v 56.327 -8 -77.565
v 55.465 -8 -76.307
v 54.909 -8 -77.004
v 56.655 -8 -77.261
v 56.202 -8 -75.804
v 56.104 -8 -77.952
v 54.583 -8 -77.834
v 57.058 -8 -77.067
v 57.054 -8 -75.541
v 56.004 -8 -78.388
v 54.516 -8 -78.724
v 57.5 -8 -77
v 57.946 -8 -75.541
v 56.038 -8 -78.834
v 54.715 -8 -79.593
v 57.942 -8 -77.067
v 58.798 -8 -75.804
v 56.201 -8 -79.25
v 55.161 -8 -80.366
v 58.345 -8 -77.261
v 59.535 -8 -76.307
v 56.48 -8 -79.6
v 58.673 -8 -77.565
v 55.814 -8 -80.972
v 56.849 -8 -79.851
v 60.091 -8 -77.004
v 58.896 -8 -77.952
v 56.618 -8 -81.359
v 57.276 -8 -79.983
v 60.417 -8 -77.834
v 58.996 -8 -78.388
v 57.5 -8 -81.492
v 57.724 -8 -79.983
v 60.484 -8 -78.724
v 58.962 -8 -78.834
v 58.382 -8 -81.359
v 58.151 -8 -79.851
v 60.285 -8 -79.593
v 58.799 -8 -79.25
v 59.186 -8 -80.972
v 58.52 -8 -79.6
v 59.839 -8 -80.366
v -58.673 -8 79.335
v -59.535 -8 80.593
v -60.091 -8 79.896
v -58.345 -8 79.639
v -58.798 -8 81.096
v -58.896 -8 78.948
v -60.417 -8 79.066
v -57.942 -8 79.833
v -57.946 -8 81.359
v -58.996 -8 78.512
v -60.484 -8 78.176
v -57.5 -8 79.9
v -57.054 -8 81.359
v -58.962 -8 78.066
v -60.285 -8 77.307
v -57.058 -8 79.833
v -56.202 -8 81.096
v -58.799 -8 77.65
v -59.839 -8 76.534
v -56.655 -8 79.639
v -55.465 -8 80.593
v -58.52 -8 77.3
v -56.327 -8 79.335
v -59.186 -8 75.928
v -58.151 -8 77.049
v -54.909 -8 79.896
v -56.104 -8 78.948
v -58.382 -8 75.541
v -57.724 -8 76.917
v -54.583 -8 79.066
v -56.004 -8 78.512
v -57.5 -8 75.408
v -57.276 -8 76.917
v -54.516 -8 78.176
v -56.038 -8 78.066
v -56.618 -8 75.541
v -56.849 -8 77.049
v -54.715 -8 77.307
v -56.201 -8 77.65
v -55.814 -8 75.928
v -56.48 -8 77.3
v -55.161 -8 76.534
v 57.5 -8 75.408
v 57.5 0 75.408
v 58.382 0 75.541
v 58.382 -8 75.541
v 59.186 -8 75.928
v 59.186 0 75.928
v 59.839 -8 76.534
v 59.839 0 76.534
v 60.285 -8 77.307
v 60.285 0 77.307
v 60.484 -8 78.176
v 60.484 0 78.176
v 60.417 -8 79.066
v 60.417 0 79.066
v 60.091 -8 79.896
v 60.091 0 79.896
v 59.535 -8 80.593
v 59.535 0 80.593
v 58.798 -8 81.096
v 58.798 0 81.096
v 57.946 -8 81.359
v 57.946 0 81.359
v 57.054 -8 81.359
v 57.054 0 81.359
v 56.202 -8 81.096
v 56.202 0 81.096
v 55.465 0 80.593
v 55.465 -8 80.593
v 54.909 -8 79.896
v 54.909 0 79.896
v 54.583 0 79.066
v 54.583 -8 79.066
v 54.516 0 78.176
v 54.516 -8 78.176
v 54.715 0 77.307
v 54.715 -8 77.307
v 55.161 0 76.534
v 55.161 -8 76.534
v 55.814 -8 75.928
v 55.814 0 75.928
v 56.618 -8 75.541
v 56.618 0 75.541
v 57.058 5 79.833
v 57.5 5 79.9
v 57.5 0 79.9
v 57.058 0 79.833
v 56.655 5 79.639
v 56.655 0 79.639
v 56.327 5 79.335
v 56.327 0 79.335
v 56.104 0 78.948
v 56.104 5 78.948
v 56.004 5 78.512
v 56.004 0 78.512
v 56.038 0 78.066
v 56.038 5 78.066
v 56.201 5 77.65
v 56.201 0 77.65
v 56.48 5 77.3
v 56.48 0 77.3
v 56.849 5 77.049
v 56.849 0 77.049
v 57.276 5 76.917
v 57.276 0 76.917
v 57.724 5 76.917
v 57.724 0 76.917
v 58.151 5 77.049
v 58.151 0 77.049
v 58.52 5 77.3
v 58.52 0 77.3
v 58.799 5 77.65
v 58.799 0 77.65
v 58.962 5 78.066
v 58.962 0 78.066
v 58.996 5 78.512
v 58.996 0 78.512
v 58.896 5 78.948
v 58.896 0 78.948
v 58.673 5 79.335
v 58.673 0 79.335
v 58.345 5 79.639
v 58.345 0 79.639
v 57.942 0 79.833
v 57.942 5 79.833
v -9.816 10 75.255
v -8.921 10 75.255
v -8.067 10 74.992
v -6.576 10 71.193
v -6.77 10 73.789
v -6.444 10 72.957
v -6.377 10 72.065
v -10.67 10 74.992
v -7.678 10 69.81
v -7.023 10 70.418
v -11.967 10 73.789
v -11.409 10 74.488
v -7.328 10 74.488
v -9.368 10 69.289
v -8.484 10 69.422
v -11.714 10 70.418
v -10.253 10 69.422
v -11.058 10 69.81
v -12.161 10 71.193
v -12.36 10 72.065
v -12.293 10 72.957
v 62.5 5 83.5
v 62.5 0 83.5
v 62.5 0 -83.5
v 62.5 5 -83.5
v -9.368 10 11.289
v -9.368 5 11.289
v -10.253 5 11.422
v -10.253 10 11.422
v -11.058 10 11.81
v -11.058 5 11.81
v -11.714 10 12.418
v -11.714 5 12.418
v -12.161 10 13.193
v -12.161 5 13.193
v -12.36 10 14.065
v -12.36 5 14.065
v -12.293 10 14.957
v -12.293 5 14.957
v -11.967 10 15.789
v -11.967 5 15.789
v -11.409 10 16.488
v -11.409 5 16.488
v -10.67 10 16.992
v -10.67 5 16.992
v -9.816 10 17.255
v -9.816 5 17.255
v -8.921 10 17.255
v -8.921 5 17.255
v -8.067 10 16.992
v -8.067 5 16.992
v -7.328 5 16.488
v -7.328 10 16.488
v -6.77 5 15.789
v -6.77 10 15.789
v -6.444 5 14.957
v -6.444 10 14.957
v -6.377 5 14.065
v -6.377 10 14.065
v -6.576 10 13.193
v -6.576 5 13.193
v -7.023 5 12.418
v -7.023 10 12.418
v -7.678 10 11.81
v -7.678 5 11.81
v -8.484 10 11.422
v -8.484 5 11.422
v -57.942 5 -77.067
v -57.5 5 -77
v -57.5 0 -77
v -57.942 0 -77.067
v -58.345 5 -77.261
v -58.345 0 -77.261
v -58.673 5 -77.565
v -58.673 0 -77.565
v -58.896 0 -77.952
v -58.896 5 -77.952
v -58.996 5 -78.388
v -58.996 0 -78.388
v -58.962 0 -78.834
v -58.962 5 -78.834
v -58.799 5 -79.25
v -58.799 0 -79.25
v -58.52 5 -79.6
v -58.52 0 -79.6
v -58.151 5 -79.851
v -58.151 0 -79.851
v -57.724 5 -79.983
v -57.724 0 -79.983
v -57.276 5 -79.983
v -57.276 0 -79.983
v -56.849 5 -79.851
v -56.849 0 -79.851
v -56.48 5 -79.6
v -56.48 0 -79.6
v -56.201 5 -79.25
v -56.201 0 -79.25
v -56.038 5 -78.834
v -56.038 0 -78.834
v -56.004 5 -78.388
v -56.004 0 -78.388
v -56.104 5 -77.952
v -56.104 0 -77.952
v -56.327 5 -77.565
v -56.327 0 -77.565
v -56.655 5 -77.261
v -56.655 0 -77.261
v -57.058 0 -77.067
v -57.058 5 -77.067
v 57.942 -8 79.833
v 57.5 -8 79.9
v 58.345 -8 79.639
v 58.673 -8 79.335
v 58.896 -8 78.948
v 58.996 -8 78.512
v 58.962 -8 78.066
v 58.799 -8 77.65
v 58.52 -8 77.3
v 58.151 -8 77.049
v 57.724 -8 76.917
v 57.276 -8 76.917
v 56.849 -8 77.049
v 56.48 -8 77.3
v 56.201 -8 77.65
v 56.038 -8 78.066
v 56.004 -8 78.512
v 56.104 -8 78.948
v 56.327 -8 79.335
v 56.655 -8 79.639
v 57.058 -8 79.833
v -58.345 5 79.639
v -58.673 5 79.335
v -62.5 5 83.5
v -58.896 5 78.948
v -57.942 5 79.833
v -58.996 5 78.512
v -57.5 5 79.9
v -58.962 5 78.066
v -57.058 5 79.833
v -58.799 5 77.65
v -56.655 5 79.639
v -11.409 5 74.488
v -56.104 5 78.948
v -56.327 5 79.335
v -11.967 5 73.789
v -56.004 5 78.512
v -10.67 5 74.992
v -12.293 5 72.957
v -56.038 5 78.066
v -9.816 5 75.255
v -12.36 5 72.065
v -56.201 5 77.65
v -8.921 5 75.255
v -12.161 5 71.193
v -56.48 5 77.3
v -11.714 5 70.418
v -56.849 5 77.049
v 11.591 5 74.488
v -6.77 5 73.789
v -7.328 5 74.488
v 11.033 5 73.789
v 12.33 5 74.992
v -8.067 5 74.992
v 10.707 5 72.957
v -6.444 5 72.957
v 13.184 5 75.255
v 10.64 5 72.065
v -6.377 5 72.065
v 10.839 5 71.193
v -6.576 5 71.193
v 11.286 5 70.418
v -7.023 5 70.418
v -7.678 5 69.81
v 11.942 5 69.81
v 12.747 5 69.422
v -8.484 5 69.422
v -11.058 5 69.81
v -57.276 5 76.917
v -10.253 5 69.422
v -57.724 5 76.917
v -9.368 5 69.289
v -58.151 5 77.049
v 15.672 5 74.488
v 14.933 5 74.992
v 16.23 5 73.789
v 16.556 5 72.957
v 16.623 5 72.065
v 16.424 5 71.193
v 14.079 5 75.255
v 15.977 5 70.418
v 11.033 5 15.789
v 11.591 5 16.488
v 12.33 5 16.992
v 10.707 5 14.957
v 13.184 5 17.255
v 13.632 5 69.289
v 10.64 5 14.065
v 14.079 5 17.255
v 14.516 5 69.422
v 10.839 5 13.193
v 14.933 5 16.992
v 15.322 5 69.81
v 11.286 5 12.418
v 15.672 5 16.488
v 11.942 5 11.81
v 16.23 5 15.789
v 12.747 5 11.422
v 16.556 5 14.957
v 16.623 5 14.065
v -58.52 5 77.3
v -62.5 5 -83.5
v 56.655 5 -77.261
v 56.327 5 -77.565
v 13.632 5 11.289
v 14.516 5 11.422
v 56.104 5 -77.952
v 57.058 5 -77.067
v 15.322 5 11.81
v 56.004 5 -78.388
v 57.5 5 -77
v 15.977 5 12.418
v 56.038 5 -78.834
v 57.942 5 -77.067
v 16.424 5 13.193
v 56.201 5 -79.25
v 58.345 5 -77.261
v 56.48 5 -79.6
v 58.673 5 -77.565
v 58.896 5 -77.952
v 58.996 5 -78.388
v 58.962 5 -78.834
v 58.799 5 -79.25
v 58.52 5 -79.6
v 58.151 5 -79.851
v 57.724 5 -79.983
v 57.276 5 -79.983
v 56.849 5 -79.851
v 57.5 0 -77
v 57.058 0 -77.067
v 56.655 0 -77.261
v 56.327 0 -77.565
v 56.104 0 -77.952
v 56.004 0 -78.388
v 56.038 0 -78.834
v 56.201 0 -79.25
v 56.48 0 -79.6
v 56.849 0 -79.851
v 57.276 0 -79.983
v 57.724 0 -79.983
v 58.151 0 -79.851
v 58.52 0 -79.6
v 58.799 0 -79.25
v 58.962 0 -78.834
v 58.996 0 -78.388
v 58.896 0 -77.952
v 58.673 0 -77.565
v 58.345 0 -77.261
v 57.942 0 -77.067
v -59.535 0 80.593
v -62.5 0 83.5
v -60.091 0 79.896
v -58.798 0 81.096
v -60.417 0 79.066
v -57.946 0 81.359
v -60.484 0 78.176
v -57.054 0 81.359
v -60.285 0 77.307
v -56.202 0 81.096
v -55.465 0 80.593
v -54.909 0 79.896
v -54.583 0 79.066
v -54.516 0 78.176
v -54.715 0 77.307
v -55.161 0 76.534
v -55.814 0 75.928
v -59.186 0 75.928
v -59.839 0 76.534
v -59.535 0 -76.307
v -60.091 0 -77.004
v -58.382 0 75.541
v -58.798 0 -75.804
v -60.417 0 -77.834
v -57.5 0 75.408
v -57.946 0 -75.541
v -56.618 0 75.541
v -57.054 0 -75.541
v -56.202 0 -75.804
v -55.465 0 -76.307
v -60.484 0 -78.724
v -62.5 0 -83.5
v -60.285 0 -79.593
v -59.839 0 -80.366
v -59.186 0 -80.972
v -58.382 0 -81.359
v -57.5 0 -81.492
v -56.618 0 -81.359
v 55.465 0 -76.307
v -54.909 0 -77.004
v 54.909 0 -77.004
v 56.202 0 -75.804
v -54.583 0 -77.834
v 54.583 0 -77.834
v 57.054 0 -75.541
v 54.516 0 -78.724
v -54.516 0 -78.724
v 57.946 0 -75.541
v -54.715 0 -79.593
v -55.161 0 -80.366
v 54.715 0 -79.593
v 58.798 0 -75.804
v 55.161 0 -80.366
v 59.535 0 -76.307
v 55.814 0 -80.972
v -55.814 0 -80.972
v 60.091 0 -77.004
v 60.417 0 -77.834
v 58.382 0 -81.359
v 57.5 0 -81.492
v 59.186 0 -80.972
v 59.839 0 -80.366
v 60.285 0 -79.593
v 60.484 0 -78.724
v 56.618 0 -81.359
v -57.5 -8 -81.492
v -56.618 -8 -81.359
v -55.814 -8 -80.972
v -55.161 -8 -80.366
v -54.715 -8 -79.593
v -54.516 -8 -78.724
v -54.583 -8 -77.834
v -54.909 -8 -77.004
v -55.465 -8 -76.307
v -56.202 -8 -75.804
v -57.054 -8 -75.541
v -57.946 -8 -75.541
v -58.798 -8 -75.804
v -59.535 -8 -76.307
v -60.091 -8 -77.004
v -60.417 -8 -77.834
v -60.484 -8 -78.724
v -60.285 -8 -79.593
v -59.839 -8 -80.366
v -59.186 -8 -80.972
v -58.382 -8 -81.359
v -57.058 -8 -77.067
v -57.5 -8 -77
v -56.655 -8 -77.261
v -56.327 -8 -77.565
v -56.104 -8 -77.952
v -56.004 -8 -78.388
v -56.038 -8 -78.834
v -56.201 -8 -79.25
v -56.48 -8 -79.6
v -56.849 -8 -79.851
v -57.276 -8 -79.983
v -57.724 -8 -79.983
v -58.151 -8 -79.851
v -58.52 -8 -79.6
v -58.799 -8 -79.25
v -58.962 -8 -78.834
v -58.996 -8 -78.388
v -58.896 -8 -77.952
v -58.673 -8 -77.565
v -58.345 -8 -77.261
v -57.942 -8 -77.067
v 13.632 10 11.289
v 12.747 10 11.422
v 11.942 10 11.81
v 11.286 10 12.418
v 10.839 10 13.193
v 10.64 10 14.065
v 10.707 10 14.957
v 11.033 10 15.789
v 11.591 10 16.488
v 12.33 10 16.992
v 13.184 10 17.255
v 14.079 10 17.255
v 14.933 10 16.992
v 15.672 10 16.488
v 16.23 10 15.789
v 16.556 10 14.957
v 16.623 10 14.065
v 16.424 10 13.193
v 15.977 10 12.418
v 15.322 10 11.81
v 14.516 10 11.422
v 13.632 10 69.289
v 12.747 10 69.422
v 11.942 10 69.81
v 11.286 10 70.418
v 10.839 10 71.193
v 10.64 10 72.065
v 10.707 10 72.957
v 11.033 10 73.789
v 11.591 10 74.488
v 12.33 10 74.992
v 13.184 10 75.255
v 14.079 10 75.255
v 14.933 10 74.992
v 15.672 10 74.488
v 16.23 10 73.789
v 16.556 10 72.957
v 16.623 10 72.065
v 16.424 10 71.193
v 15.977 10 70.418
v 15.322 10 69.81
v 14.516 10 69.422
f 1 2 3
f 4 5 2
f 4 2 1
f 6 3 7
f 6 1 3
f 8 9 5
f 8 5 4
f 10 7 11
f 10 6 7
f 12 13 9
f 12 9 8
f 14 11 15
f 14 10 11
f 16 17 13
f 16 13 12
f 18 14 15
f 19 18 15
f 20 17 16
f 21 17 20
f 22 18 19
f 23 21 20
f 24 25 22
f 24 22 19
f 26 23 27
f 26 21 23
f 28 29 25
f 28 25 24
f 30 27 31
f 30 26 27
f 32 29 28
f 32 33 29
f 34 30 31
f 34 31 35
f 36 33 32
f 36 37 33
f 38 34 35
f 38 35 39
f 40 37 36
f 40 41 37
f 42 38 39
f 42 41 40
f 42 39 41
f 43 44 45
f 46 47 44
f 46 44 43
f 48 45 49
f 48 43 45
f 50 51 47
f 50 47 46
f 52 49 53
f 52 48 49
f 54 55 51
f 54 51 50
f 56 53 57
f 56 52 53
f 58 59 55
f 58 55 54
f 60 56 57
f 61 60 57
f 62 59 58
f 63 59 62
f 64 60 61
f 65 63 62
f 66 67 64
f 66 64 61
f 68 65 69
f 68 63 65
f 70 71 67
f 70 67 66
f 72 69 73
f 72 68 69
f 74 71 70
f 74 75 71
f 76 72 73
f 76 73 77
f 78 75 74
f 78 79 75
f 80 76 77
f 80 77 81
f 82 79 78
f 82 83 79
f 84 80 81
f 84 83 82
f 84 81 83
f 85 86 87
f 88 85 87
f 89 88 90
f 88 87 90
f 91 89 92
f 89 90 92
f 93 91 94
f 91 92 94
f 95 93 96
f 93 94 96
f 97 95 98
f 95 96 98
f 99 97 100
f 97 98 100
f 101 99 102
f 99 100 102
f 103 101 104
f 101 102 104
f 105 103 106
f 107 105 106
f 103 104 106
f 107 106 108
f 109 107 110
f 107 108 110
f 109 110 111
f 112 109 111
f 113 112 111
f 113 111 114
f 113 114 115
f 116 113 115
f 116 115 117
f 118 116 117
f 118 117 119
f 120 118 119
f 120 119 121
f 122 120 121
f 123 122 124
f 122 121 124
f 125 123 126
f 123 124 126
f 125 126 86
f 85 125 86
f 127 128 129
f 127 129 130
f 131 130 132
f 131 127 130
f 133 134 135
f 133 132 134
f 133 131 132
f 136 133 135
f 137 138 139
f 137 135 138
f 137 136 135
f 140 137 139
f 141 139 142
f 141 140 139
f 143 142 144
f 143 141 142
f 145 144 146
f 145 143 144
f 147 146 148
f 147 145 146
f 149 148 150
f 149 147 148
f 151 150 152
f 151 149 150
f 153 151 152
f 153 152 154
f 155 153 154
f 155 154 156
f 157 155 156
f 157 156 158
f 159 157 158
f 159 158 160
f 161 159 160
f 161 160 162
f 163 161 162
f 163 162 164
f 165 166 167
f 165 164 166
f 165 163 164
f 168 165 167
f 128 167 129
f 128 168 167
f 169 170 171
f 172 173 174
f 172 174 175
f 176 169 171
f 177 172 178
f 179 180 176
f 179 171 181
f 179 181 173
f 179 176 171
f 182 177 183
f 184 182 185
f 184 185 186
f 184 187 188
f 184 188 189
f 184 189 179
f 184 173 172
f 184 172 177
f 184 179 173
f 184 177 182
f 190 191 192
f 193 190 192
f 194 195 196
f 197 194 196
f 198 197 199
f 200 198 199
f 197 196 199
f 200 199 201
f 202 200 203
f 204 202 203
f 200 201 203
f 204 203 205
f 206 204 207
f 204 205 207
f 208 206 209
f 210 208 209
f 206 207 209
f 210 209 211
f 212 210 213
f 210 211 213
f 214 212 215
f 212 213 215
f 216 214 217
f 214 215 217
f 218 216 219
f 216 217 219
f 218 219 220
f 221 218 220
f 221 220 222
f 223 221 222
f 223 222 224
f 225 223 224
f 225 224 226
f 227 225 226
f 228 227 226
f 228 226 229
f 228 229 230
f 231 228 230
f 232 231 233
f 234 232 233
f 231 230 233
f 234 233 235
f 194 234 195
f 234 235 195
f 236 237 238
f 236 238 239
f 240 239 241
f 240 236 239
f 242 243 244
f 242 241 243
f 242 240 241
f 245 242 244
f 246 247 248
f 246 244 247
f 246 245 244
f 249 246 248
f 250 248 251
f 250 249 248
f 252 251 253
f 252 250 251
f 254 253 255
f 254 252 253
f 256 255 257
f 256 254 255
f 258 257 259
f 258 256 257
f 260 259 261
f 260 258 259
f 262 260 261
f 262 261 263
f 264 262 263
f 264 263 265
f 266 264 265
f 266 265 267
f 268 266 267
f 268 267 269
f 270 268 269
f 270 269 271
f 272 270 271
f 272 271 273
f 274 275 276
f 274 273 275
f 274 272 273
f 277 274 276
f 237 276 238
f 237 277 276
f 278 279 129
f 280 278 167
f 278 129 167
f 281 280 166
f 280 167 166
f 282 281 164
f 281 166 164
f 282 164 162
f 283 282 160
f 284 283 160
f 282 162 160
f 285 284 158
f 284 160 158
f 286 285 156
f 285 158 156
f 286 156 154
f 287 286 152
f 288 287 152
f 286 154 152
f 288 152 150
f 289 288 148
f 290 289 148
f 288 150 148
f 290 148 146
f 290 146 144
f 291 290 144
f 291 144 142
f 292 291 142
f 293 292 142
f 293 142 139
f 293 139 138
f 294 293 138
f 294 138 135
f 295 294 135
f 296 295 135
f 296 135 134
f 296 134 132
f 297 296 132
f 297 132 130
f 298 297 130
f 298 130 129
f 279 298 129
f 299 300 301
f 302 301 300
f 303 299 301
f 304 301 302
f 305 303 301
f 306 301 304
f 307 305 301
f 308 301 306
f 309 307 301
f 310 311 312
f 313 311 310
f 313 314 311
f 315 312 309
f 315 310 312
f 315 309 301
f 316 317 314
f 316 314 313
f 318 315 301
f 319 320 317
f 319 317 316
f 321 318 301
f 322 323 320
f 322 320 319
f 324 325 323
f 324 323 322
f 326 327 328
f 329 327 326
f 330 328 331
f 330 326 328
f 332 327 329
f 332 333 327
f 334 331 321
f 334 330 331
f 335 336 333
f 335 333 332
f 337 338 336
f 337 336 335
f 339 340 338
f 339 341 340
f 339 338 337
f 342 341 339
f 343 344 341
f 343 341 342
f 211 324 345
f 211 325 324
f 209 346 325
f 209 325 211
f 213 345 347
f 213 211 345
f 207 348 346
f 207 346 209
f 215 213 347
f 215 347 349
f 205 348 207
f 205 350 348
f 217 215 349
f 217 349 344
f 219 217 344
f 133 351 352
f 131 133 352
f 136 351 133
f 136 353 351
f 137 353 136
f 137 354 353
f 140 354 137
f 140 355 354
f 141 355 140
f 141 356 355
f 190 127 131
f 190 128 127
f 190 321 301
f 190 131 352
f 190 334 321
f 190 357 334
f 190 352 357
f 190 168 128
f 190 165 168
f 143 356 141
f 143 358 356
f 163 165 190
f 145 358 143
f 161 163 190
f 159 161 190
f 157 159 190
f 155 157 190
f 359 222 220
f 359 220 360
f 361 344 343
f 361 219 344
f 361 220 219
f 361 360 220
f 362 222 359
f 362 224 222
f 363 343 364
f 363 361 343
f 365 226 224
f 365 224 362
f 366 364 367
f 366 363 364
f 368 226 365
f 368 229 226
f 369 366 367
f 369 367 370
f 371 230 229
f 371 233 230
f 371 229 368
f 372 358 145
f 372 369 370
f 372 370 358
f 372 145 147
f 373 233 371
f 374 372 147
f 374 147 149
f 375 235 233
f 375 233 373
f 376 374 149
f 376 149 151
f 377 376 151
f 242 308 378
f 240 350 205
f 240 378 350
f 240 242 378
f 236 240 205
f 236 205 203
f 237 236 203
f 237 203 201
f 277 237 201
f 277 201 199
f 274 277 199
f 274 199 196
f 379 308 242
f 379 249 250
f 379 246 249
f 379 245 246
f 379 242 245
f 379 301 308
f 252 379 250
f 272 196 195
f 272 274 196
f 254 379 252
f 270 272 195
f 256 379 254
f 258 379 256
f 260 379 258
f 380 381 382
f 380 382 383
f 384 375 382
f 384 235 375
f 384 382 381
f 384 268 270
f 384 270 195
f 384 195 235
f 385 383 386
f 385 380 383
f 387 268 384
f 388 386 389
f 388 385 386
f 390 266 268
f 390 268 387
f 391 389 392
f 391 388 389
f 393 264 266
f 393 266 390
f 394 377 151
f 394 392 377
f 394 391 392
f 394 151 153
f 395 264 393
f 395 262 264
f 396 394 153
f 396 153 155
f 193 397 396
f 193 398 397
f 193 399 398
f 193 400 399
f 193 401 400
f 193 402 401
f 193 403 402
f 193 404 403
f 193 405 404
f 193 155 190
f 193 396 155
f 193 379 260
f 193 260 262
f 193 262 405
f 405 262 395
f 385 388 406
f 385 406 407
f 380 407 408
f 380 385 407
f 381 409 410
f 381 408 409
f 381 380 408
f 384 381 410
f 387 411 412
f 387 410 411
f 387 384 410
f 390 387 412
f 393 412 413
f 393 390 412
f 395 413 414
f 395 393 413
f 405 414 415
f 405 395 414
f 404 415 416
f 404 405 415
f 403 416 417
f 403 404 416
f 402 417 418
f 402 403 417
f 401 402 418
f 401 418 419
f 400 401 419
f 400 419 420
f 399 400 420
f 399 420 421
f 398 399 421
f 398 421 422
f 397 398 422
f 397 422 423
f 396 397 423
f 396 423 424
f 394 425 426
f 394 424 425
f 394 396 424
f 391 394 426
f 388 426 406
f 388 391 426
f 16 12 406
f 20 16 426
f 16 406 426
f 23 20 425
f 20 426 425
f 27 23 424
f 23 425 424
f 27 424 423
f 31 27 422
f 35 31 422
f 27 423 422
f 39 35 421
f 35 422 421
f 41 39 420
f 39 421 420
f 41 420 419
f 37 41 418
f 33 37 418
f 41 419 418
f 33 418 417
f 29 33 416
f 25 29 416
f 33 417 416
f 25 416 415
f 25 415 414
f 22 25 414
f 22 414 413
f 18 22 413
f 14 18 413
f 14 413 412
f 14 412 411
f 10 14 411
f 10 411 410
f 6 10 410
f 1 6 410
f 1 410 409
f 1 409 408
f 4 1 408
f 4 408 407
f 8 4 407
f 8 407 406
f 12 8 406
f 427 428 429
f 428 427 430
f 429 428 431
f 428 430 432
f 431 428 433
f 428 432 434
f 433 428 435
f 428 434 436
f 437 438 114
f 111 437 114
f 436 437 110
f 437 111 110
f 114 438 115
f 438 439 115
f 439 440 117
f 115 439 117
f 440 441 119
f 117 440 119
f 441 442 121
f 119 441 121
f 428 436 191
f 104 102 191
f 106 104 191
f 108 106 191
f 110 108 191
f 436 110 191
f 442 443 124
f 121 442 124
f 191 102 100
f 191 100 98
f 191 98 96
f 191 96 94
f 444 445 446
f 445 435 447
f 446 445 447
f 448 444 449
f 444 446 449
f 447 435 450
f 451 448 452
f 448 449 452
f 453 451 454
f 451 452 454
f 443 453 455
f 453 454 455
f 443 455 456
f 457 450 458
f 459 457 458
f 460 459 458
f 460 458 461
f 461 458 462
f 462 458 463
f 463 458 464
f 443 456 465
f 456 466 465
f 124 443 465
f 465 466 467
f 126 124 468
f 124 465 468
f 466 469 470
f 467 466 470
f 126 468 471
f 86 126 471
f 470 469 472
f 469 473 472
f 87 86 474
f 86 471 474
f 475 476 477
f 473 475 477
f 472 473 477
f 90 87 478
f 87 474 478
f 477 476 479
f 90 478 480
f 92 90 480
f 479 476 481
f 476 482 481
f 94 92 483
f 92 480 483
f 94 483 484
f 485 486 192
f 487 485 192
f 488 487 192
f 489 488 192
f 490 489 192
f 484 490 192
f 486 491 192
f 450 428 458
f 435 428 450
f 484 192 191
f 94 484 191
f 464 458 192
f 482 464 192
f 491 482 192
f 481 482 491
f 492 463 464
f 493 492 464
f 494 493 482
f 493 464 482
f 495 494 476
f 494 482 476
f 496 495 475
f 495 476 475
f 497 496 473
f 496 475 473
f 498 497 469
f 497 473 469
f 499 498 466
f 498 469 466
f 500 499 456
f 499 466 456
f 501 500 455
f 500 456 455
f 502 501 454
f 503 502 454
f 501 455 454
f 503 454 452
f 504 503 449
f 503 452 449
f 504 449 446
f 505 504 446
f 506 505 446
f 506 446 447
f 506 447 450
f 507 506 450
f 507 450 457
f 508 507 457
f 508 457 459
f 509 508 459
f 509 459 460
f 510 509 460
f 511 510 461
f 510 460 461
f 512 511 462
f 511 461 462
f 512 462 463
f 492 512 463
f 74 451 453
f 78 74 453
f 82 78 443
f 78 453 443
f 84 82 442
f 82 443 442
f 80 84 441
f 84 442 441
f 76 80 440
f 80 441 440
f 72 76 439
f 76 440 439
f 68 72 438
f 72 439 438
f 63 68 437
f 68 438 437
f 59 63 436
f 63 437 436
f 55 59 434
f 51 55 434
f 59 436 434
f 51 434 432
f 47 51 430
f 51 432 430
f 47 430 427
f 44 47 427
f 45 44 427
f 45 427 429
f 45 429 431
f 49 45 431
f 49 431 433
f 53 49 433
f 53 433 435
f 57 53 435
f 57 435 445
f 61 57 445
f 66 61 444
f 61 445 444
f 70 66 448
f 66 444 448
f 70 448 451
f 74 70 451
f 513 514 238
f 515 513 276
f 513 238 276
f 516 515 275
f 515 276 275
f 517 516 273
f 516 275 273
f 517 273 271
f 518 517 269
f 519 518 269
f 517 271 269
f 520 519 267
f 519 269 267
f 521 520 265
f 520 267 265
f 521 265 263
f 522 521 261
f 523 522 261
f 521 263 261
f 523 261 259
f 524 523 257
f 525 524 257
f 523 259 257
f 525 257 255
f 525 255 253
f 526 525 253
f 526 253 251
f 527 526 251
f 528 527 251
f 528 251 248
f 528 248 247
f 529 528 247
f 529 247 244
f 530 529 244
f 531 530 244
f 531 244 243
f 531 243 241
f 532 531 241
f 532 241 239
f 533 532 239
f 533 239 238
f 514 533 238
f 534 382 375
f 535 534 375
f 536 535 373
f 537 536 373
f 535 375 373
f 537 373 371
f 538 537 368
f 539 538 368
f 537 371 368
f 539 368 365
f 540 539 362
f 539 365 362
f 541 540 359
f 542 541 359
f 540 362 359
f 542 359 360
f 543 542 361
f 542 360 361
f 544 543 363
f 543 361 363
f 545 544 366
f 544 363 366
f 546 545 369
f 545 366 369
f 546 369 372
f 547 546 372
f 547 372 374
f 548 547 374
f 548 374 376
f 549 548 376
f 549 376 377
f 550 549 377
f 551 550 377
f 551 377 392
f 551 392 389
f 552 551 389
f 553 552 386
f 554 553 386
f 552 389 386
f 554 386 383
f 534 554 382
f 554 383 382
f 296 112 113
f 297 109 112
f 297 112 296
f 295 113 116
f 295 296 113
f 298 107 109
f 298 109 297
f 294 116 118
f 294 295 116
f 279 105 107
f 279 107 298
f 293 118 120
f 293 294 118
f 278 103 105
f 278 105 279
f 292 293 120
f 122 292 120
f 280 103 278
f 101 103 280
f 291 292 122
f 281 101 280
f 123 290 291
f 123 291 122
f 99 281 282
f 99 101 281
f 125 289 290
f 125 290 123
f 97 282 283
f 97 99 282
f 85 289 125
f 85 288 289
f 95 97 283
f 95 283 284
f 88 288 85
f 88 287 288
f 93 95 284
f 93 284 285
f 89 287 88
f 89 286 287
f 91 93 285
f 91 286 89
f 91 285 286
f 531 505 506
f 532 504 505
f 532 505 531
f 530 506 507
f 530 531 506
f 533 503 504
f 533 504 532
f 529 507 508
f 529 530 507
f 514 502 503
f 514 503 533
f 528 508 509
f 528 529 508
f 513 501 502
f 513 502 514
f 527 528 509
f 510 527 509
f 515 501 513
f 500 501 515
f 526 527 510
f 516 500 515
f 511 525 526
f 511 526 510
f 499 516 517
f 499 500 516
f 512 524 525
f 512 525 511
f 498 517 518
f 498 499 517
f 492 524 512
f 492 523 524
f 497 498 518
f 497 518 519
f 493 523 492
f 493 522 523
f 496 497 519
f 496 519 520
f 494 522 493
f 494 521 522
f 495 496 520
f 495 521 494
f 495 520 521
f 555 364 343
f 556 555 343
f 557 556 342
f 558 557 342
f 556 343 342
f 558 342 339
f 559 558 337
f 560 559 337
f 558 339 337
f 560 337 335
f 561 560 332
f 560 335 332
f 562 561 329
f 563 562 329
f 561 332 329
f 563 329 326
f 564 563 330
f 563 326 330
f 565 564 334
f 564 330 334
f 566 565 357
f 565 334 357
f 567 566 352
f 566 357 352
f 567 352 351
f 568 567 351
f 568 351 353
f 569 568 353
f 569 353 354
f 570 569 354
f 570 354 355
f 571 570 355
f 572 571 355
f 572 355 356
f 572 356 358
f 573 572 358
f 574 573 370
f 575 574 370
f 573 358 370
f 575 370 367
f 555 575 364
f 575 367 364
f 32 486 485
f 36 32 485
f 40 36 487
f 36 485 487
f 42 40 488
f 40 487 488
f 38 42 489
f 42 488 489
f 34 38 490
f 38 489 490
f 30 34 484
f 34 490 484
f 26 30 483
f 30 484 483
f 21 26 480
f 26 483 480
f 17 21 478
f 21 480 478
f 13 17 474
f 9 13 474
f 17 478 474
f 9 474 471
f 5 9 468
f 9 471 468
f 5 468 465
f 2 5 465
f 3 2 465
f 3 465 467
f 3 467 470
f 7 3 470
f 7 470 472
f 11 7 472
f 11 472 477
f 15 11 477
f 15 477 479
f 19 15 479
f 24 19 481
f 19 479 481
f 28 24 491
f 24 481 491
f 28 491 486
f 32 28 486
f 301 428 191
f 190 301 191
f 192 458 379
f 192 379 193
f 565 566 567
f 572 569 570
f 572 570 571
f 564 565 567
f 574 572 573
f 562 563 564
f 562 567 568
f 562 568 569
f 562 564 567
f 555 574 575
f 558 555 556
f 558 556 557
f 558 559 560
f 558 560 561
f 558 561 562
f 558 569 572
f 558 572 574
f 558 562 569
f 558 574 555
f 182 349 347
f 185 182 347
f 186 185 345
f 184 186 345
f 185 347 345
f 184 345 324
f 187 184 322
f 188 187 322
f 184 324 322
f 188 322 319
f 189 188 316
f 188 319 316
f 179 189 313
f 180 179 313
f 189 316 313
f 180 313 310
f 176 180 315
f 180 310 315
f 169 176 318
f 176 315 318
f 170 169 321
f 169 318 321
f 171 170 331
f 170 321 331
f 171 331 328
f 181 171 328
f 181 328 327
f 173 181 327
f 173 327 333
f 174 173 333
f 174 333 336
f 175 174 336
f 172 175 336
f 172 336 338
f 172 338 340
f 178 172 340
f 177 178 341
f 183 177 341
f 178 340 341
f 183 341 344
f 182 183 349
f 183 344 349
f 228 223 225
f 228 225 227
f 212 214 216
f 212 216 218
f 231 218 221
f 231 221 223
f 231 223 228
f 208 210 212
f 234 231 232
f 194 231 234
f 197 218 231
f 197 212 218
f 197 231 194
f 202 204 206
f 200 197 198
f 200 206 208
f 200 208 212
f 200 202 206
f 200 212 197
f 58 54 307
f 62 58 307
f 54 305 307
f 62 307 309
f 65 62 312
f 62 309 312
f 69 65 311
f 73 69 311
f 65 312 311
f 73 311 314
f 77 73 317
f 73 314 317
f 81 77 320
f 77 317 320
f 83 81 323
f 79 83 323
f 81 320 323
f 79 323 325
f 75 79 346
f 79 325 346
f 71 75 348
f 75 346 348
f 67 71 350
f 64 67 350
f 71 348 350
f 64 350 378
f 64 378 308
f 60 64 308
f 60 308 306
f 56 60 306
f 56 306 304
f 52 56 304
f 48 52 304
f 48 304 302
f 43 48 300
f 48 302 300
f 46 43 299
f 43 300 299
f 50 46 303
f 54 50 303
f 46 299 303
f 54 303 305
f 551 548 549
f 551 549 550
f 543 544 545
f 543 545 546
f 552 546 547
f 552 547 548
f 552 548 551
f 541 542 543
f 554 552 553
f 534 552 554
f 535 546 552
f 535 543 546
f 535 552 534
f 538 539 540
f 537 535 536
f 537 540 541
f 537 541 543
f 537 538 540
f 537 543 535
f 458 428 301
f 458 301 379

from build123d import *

# Parameters (mm, degrees)
ESQUISSE1_W                  = 125
ESQUISSE1_H                  = 167
BOSS_EXTRU_1_DEPTH           = 5
ENL_V_MAT_EXTRU_1_DEPTH      = 105.419825704
ENL_V_MAT_EXTRU_1_DEPTH_BACK = 105.419825704
ESQUISSE2_R                  = 1.5
ESQUISSE3_R                  = 2.992151318
BOSS_EXTRU_2_DEPTH           = 8
ESQUISSE5_R                  = 1.5
ENL_V_MAT_EXTRU_2_DEPTH      = 106.107088248
ESQUISSE6_R                  = 3
BOSS_EXTRU_3_DEPTH           = 5


with BuildPart() as part:
    # Esquisse1 → Boss.-Extru.1 (new body)
    with BuildSketch(Plane(origin=(0, 0, 0), x_dir=(1, 0, 0), z_dir=(0, 1, 0))):
        Rectangle(ESQUISSE1_W, ESQUISSE1_H)
    extrude(amount=BOSS_EXTRU_1_DEPTH)

    # Esquisse2 → Enlèv. mat.-Extru.1 (cut, two sides: drawn at the far end of the back side and taken through both)
    with BuildSketch(Plane.XZ.offset(-ENL_V_MAT_EXTRU_1_DEPTH_BACK)):
        with Locations(Location((-57.5, 78.4, 0), (0, 0, 90))):
            Circle(ESQUISSE2_R)
        with Locations(Location((57.5, 78.4, 0), (0, 0, 90))):
            Circle(ESQUISSE2_R)
        with Locations(Location((57.5, -78.5, 0), (0, 0, 90))):
            Circle(ESQUISSE2_R)
        with Locations(Location((-57.5, -78.5, 0), (0, 0, 90))):
            Circle(ESQUISSE2_R)
    extrude(amount=ENL_V_MAT_EXTRU_1_DEPTH + ENL_V_MAT_EXTRU_1_DEPTH_BACK, mode=Mode.SUBTRACT)

    # Esquisse3 → Boss.-Extru.2 (add)
    with BuildSketch(Plane.XZ):
        with Locations(Location((-57.5, 78.4, 0), (0, 0, 270))):
            Circle(ESQUISSE3_R)
        with Locations(Location((57.5, 78.4, 0), (0, 0, 270))):
            Circle(ESQUISSE3_R)
        with Locations(Location((57.5, -78.5, 0), (0, 0, 270))):
            Circle(ESQUISSE3_R)
        with Locations(Location((-57.5, -78.5, 0), (0, 0, 270))):
            Circle(ESQUISSE3_R)
    extrude(amount=BOSS_EXTRU_2_DEPTH)

    # Esquisse5 → Enlèv. mat.-Extru.2 (cut, through all)
    with BuildSketch(Plane(origin=(0, 5, 0), x_dir=(1, 0, 0), z_dir=(0, 1, 0))):
        with Locations(Location((-57.5, 78.5, 0), (0, 0, 270))):
            Circle(ESQUISSE5_R)
        with Locations(Location((57.5, 78.5, 0), (0, 0, 270))):
            Circle(ESQUISSE5_R)
        with Locations(Location((57.5, -78.4, 0), (0, 0, 270))):
            Circle(ESQUISSE5_R)
        with Locations(Location((-57.5, -78.4, 0), (0, 0, 270))):
            Circle(ESQUISSE5_R)
    extrude(amount=-ENL_V_MAT_EXTRU_2_DEPTH, mode=Mode.SUBTRACT)

    # Esquisse6 → Boss.-Extru.3 (add)
    with BuildSketch(Plane(origin=(0, 5, 0), x_dir=(1, 0, 0), z_dir=(0, 1, 0))):
        with Locations(Location((-9.368446166, -72.288956225, 0), (0, 0, 90))):
            Circle(ESQUISSE6_R)
        with Locations(Location((-9.368446166, -14.288956225, 0), (0, 0, 90))):
            Circle(ESQUISSE6_R)
        with Locations(Location((13.631553834, -14.288956225, 0), (0, 0, 90))):
            Circle(ESQUISSE6_R)
        with Locations(Location((13.631553834, -72.288956225, 0), (0, 0, 90))):
            Circle(ESQUISSE6_R)
    extrude(amount=BOSS_EXTRU_3_DEPTH)


solid = part.part
